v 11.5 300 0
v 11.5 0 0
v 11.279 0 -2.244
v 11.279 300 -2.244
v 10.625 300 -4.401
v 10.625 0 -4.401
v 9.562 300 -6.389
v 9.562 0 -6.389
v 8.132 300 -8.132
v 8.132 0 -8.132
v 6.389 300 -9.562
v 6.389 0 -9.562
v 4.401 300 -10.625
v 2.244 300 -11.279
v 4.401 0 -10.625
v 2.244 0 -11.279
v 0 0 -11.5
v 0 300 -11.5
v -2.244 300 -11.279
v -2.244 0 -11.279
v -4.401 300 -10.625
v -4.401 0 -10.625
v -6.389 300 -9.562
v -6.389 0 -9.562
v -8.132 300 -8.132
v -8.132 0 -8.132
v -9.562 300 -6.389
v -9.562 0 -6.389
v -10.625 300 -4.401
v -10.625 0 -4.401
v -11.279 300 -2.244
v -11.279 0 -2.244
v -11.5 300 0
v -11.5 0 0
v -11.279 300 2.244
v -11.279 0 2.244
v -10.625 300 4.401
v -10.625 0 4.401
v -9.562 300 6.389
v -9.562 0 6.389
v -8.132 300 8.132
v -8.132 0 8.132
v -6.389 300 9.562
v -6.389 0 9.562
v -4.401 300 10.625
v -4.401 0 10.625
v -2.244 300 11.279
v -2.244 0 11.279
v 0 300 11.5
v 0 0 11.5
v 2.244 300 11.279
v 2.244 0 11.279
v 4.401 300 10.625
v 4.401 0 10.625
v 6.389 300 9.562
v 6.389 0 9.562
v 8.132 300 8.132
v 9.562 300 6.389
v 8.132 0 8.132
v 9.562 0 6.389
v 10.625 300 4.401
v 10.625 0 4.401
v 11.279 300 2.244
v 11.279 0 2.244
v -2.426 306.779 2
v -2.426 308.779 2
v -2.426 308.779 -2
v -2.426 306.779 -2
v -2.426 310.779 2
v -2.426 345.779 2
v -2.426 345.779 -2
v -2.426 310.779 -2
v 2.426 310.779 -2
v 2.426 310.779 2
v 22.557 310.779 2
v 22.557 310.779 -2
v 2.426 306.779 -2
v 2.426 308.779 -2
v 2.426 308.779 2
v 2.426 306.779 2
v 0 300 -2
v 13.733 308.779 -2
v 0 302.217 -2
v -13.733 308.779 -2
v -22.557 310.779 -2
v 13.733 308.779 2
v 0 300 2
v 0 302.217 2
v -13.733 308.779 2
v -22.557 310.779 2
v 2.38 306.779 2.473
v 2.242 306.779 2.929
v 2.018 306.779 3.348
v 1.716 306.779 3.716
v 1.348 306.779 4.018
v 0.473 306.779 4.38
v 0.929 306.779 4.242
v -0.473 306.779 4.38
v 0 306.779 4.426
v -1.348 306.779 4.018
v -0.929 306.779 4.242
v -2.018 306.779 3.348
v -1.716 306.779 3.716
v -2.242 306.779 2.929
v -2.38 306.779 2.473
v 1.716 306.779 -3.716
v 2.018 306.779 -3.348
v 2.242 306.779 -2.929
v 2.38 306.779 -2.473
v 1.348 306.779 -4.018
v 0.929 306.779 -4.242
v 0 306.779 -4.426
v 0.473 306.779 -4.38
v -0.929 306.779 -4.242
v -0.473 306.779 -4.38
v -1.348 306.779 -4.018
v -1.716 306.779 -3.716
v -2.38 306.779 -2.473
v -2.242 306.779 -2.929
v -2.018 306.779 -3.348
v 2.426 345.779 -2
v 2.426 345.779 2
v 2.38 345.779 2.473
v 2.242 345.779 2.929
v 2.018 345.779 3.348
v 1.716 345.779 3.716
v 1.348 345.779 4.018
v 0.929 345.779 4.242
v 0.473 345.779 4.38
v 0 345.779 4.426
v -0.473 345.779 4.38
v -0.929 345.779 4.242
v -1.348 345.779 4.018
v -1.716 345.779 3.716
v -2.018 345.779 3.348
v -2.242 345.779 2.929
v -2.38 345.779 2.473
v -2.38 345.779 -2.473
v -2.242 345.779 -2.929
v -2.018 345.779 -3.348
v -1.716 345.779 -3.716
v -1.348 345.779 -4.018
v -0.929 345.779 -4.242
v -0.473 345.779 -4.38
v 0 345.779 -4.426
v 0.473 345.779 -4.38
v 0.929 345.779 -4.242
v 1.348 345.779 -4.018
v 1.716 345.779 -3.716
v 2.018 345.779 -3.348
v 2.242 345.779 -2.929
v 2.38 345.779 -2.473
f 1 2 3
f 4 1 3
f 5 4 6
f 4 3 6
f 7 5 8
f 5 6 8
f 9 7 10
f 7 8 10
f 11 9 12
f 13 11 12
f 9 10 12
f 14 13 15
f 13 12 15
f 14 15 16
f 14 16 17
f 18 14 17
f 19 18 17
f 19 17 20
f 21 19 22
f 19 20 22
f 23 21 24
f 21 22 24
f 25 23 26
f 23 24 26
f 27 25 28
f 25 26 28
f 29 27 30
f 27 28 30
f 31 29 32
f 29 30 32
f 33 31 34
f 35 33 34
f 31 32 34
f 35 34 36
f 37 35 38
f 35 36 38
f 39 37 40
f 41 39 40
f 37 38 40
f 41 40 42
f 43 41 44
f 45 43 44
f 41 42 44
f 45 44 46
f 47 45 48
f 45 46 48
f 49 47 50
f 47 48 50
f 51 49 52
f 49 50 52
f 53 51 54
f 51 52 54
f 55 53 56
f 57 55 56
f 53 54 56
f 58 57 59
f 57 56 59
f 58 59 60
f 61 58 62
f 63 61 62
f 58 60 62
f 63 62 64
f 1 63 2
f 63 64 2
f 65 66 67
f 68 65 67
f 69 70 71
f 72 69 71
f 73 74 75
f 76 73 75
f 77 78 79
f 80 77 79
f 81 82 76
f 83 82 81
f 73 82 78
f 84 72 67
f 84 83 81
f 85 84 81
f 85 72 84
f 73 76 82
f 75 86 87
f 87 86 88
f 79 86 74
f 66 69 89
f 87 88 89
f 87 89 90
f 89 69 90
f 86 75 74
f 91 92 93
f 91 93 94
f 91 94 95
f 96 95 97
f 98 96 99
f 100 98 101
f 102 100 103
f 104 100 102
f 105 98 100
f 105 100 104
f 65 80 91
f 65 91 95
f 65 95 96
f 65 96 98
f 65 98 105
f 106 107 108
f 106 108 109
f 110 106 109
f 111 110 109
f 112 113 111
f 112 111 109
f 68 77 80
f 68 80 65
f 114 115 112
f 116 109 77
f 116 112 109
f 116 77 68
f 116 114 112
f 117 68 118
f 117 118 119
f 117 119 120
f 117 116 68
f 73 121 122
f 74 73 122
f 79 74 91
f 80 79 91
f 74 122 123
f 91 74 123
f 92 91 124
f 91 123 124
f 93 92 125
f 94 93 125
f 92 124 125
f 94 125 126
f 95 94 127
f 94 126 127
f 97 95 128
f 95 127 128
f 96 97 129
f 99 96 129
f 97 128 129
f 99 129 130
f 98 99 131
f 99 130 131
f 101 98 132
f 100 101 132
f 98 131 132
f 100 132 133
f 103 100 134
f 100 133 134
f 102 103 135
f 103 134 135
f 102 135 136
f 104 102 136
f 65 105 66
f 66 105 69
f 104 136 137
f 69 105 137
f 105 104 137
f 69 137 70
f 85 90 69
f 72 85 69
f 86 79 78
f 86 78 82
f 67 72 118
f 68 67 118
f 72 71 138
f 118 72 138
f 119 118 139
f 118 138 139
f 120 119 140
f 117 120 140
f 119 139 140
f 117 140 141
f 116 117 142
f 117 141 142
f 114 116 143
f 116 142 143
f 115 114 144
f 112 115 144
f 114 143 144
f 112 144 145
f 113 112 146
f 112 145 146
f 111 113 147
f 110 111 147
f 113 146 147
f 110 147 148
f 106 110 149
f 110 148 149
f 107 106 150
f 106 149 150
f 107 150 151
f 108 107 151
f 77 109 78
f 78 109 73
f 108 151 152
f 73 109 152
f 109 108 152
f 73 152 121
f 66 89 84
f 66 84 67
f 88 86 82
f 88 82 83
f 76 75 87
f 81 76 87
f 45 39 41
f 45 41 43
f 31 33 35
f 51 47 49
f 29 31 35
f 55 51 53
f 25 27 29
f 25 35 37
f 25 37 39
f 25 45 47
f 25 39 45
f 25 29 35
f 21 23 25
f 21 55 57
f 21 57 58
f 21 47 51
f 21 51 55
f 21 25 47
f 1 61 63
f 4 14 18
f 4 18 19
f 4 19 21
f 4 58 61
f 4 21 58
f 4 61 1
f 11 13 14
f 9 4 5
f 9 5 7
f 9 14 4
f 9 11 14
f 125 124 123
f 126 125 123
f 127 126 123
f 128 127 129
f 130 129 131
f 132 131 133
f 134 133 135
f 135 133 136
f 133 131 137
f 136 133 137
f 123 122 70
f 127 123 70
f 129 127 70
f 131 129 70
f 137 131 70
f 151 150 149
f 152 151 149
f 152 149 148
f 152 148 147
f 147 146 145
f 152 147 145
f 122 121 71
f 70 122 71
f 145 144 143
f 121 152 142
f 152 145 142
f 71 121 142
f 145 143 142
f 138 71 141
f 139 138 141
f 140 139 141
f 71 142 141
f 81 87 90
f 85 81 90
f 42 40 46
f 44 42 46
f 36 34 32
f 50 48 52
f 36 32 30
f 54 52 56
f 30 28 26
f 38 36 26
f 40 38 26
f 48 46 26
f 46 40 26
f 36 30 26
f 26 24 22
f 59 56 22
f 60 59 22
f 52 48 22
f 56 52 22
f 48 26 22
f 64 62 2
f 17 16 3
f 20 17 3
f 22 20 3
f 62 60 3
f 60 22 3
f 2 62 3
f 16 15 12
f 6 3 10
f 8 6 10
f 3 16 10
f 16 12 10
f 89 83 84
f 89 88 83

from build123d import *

# Parameters (mm, degrees)
SKETCH2_R                = 11.5
BOSS_EXTRUDE1_DEPTH      = 300
BOSS_EXTRUDE2_DEPTH      = 2
BOSS_EXTRUDE2_DEPTH_BACK = 2
BOSS_EXTRUDE5_DEPTH      = 35
BOSS_EXTRUDE5_DEPTH_BACK = 4


with BuildPart() as part:
    # Sketch2 → Boss-Extrude1 (new body)
    with BuildSketch(Plane(origin=(0, 0, 0), x_dir=(1, 0, 0), z_dir=(0, 1, 0))):
        Circle(SKETCH2_R)
    extrude(amount=BOSS_EXTRUDE1_DEPTH)


with BuildPart() as body_2:
    # Sketch3 → Boss-Extrude2 (new, two sides: drawn at the far end of the back side and taken through both)
    with BuildSketch(Plane.XY.offset(-BOSS_EXTRUDE2_DEPTH_BACK)):
        Polygon((0, 300), (-22.556872792, 310.779030097), (22.556872792, 310.779030097), align=None)
        Polygon((0, 302.216619319), (-13.732911385, 308.779030097), (13.732911385, 308.779030097), align=None, mode=Mode.SUBTRACT)
    extrude(amount=BOSS_EXTRUDE2_DEPTH + BOSS_EXTRUDE2_DEPTH_BACK)

    # Sketch6 → Boss-Extrude5 (add, two sides: drawn at the far end of the back side and taken through both)
    with BuildSketch(Plane(origin=(0, 310.779030097, 0), x_dir=(1, 0, 0), z_dir=(0, 1, 0)).offset(-BOSS_EXTRUDE5_DEPTH_BACK)):
        with BuildLine():
            Line((2.426445001, 2), (2.426445001, -2))
            ThreePointArc((2.426445001, -2), (0, -4.426445001), (-2.426445001, -2))
            Line((-2.426445001, -2), (-2.426445001, 2))
            ThreePointArc((-2.426445001, 2), (0, 4.426445001), (2.426445001, 2))
        make_face()
    extrude(amount=BOSS_EXTRUDE5_DEPTH + BOSS_EXTRUDE5_DEPTH_BACK)


solid = Compound([part.part, body_2.part])
